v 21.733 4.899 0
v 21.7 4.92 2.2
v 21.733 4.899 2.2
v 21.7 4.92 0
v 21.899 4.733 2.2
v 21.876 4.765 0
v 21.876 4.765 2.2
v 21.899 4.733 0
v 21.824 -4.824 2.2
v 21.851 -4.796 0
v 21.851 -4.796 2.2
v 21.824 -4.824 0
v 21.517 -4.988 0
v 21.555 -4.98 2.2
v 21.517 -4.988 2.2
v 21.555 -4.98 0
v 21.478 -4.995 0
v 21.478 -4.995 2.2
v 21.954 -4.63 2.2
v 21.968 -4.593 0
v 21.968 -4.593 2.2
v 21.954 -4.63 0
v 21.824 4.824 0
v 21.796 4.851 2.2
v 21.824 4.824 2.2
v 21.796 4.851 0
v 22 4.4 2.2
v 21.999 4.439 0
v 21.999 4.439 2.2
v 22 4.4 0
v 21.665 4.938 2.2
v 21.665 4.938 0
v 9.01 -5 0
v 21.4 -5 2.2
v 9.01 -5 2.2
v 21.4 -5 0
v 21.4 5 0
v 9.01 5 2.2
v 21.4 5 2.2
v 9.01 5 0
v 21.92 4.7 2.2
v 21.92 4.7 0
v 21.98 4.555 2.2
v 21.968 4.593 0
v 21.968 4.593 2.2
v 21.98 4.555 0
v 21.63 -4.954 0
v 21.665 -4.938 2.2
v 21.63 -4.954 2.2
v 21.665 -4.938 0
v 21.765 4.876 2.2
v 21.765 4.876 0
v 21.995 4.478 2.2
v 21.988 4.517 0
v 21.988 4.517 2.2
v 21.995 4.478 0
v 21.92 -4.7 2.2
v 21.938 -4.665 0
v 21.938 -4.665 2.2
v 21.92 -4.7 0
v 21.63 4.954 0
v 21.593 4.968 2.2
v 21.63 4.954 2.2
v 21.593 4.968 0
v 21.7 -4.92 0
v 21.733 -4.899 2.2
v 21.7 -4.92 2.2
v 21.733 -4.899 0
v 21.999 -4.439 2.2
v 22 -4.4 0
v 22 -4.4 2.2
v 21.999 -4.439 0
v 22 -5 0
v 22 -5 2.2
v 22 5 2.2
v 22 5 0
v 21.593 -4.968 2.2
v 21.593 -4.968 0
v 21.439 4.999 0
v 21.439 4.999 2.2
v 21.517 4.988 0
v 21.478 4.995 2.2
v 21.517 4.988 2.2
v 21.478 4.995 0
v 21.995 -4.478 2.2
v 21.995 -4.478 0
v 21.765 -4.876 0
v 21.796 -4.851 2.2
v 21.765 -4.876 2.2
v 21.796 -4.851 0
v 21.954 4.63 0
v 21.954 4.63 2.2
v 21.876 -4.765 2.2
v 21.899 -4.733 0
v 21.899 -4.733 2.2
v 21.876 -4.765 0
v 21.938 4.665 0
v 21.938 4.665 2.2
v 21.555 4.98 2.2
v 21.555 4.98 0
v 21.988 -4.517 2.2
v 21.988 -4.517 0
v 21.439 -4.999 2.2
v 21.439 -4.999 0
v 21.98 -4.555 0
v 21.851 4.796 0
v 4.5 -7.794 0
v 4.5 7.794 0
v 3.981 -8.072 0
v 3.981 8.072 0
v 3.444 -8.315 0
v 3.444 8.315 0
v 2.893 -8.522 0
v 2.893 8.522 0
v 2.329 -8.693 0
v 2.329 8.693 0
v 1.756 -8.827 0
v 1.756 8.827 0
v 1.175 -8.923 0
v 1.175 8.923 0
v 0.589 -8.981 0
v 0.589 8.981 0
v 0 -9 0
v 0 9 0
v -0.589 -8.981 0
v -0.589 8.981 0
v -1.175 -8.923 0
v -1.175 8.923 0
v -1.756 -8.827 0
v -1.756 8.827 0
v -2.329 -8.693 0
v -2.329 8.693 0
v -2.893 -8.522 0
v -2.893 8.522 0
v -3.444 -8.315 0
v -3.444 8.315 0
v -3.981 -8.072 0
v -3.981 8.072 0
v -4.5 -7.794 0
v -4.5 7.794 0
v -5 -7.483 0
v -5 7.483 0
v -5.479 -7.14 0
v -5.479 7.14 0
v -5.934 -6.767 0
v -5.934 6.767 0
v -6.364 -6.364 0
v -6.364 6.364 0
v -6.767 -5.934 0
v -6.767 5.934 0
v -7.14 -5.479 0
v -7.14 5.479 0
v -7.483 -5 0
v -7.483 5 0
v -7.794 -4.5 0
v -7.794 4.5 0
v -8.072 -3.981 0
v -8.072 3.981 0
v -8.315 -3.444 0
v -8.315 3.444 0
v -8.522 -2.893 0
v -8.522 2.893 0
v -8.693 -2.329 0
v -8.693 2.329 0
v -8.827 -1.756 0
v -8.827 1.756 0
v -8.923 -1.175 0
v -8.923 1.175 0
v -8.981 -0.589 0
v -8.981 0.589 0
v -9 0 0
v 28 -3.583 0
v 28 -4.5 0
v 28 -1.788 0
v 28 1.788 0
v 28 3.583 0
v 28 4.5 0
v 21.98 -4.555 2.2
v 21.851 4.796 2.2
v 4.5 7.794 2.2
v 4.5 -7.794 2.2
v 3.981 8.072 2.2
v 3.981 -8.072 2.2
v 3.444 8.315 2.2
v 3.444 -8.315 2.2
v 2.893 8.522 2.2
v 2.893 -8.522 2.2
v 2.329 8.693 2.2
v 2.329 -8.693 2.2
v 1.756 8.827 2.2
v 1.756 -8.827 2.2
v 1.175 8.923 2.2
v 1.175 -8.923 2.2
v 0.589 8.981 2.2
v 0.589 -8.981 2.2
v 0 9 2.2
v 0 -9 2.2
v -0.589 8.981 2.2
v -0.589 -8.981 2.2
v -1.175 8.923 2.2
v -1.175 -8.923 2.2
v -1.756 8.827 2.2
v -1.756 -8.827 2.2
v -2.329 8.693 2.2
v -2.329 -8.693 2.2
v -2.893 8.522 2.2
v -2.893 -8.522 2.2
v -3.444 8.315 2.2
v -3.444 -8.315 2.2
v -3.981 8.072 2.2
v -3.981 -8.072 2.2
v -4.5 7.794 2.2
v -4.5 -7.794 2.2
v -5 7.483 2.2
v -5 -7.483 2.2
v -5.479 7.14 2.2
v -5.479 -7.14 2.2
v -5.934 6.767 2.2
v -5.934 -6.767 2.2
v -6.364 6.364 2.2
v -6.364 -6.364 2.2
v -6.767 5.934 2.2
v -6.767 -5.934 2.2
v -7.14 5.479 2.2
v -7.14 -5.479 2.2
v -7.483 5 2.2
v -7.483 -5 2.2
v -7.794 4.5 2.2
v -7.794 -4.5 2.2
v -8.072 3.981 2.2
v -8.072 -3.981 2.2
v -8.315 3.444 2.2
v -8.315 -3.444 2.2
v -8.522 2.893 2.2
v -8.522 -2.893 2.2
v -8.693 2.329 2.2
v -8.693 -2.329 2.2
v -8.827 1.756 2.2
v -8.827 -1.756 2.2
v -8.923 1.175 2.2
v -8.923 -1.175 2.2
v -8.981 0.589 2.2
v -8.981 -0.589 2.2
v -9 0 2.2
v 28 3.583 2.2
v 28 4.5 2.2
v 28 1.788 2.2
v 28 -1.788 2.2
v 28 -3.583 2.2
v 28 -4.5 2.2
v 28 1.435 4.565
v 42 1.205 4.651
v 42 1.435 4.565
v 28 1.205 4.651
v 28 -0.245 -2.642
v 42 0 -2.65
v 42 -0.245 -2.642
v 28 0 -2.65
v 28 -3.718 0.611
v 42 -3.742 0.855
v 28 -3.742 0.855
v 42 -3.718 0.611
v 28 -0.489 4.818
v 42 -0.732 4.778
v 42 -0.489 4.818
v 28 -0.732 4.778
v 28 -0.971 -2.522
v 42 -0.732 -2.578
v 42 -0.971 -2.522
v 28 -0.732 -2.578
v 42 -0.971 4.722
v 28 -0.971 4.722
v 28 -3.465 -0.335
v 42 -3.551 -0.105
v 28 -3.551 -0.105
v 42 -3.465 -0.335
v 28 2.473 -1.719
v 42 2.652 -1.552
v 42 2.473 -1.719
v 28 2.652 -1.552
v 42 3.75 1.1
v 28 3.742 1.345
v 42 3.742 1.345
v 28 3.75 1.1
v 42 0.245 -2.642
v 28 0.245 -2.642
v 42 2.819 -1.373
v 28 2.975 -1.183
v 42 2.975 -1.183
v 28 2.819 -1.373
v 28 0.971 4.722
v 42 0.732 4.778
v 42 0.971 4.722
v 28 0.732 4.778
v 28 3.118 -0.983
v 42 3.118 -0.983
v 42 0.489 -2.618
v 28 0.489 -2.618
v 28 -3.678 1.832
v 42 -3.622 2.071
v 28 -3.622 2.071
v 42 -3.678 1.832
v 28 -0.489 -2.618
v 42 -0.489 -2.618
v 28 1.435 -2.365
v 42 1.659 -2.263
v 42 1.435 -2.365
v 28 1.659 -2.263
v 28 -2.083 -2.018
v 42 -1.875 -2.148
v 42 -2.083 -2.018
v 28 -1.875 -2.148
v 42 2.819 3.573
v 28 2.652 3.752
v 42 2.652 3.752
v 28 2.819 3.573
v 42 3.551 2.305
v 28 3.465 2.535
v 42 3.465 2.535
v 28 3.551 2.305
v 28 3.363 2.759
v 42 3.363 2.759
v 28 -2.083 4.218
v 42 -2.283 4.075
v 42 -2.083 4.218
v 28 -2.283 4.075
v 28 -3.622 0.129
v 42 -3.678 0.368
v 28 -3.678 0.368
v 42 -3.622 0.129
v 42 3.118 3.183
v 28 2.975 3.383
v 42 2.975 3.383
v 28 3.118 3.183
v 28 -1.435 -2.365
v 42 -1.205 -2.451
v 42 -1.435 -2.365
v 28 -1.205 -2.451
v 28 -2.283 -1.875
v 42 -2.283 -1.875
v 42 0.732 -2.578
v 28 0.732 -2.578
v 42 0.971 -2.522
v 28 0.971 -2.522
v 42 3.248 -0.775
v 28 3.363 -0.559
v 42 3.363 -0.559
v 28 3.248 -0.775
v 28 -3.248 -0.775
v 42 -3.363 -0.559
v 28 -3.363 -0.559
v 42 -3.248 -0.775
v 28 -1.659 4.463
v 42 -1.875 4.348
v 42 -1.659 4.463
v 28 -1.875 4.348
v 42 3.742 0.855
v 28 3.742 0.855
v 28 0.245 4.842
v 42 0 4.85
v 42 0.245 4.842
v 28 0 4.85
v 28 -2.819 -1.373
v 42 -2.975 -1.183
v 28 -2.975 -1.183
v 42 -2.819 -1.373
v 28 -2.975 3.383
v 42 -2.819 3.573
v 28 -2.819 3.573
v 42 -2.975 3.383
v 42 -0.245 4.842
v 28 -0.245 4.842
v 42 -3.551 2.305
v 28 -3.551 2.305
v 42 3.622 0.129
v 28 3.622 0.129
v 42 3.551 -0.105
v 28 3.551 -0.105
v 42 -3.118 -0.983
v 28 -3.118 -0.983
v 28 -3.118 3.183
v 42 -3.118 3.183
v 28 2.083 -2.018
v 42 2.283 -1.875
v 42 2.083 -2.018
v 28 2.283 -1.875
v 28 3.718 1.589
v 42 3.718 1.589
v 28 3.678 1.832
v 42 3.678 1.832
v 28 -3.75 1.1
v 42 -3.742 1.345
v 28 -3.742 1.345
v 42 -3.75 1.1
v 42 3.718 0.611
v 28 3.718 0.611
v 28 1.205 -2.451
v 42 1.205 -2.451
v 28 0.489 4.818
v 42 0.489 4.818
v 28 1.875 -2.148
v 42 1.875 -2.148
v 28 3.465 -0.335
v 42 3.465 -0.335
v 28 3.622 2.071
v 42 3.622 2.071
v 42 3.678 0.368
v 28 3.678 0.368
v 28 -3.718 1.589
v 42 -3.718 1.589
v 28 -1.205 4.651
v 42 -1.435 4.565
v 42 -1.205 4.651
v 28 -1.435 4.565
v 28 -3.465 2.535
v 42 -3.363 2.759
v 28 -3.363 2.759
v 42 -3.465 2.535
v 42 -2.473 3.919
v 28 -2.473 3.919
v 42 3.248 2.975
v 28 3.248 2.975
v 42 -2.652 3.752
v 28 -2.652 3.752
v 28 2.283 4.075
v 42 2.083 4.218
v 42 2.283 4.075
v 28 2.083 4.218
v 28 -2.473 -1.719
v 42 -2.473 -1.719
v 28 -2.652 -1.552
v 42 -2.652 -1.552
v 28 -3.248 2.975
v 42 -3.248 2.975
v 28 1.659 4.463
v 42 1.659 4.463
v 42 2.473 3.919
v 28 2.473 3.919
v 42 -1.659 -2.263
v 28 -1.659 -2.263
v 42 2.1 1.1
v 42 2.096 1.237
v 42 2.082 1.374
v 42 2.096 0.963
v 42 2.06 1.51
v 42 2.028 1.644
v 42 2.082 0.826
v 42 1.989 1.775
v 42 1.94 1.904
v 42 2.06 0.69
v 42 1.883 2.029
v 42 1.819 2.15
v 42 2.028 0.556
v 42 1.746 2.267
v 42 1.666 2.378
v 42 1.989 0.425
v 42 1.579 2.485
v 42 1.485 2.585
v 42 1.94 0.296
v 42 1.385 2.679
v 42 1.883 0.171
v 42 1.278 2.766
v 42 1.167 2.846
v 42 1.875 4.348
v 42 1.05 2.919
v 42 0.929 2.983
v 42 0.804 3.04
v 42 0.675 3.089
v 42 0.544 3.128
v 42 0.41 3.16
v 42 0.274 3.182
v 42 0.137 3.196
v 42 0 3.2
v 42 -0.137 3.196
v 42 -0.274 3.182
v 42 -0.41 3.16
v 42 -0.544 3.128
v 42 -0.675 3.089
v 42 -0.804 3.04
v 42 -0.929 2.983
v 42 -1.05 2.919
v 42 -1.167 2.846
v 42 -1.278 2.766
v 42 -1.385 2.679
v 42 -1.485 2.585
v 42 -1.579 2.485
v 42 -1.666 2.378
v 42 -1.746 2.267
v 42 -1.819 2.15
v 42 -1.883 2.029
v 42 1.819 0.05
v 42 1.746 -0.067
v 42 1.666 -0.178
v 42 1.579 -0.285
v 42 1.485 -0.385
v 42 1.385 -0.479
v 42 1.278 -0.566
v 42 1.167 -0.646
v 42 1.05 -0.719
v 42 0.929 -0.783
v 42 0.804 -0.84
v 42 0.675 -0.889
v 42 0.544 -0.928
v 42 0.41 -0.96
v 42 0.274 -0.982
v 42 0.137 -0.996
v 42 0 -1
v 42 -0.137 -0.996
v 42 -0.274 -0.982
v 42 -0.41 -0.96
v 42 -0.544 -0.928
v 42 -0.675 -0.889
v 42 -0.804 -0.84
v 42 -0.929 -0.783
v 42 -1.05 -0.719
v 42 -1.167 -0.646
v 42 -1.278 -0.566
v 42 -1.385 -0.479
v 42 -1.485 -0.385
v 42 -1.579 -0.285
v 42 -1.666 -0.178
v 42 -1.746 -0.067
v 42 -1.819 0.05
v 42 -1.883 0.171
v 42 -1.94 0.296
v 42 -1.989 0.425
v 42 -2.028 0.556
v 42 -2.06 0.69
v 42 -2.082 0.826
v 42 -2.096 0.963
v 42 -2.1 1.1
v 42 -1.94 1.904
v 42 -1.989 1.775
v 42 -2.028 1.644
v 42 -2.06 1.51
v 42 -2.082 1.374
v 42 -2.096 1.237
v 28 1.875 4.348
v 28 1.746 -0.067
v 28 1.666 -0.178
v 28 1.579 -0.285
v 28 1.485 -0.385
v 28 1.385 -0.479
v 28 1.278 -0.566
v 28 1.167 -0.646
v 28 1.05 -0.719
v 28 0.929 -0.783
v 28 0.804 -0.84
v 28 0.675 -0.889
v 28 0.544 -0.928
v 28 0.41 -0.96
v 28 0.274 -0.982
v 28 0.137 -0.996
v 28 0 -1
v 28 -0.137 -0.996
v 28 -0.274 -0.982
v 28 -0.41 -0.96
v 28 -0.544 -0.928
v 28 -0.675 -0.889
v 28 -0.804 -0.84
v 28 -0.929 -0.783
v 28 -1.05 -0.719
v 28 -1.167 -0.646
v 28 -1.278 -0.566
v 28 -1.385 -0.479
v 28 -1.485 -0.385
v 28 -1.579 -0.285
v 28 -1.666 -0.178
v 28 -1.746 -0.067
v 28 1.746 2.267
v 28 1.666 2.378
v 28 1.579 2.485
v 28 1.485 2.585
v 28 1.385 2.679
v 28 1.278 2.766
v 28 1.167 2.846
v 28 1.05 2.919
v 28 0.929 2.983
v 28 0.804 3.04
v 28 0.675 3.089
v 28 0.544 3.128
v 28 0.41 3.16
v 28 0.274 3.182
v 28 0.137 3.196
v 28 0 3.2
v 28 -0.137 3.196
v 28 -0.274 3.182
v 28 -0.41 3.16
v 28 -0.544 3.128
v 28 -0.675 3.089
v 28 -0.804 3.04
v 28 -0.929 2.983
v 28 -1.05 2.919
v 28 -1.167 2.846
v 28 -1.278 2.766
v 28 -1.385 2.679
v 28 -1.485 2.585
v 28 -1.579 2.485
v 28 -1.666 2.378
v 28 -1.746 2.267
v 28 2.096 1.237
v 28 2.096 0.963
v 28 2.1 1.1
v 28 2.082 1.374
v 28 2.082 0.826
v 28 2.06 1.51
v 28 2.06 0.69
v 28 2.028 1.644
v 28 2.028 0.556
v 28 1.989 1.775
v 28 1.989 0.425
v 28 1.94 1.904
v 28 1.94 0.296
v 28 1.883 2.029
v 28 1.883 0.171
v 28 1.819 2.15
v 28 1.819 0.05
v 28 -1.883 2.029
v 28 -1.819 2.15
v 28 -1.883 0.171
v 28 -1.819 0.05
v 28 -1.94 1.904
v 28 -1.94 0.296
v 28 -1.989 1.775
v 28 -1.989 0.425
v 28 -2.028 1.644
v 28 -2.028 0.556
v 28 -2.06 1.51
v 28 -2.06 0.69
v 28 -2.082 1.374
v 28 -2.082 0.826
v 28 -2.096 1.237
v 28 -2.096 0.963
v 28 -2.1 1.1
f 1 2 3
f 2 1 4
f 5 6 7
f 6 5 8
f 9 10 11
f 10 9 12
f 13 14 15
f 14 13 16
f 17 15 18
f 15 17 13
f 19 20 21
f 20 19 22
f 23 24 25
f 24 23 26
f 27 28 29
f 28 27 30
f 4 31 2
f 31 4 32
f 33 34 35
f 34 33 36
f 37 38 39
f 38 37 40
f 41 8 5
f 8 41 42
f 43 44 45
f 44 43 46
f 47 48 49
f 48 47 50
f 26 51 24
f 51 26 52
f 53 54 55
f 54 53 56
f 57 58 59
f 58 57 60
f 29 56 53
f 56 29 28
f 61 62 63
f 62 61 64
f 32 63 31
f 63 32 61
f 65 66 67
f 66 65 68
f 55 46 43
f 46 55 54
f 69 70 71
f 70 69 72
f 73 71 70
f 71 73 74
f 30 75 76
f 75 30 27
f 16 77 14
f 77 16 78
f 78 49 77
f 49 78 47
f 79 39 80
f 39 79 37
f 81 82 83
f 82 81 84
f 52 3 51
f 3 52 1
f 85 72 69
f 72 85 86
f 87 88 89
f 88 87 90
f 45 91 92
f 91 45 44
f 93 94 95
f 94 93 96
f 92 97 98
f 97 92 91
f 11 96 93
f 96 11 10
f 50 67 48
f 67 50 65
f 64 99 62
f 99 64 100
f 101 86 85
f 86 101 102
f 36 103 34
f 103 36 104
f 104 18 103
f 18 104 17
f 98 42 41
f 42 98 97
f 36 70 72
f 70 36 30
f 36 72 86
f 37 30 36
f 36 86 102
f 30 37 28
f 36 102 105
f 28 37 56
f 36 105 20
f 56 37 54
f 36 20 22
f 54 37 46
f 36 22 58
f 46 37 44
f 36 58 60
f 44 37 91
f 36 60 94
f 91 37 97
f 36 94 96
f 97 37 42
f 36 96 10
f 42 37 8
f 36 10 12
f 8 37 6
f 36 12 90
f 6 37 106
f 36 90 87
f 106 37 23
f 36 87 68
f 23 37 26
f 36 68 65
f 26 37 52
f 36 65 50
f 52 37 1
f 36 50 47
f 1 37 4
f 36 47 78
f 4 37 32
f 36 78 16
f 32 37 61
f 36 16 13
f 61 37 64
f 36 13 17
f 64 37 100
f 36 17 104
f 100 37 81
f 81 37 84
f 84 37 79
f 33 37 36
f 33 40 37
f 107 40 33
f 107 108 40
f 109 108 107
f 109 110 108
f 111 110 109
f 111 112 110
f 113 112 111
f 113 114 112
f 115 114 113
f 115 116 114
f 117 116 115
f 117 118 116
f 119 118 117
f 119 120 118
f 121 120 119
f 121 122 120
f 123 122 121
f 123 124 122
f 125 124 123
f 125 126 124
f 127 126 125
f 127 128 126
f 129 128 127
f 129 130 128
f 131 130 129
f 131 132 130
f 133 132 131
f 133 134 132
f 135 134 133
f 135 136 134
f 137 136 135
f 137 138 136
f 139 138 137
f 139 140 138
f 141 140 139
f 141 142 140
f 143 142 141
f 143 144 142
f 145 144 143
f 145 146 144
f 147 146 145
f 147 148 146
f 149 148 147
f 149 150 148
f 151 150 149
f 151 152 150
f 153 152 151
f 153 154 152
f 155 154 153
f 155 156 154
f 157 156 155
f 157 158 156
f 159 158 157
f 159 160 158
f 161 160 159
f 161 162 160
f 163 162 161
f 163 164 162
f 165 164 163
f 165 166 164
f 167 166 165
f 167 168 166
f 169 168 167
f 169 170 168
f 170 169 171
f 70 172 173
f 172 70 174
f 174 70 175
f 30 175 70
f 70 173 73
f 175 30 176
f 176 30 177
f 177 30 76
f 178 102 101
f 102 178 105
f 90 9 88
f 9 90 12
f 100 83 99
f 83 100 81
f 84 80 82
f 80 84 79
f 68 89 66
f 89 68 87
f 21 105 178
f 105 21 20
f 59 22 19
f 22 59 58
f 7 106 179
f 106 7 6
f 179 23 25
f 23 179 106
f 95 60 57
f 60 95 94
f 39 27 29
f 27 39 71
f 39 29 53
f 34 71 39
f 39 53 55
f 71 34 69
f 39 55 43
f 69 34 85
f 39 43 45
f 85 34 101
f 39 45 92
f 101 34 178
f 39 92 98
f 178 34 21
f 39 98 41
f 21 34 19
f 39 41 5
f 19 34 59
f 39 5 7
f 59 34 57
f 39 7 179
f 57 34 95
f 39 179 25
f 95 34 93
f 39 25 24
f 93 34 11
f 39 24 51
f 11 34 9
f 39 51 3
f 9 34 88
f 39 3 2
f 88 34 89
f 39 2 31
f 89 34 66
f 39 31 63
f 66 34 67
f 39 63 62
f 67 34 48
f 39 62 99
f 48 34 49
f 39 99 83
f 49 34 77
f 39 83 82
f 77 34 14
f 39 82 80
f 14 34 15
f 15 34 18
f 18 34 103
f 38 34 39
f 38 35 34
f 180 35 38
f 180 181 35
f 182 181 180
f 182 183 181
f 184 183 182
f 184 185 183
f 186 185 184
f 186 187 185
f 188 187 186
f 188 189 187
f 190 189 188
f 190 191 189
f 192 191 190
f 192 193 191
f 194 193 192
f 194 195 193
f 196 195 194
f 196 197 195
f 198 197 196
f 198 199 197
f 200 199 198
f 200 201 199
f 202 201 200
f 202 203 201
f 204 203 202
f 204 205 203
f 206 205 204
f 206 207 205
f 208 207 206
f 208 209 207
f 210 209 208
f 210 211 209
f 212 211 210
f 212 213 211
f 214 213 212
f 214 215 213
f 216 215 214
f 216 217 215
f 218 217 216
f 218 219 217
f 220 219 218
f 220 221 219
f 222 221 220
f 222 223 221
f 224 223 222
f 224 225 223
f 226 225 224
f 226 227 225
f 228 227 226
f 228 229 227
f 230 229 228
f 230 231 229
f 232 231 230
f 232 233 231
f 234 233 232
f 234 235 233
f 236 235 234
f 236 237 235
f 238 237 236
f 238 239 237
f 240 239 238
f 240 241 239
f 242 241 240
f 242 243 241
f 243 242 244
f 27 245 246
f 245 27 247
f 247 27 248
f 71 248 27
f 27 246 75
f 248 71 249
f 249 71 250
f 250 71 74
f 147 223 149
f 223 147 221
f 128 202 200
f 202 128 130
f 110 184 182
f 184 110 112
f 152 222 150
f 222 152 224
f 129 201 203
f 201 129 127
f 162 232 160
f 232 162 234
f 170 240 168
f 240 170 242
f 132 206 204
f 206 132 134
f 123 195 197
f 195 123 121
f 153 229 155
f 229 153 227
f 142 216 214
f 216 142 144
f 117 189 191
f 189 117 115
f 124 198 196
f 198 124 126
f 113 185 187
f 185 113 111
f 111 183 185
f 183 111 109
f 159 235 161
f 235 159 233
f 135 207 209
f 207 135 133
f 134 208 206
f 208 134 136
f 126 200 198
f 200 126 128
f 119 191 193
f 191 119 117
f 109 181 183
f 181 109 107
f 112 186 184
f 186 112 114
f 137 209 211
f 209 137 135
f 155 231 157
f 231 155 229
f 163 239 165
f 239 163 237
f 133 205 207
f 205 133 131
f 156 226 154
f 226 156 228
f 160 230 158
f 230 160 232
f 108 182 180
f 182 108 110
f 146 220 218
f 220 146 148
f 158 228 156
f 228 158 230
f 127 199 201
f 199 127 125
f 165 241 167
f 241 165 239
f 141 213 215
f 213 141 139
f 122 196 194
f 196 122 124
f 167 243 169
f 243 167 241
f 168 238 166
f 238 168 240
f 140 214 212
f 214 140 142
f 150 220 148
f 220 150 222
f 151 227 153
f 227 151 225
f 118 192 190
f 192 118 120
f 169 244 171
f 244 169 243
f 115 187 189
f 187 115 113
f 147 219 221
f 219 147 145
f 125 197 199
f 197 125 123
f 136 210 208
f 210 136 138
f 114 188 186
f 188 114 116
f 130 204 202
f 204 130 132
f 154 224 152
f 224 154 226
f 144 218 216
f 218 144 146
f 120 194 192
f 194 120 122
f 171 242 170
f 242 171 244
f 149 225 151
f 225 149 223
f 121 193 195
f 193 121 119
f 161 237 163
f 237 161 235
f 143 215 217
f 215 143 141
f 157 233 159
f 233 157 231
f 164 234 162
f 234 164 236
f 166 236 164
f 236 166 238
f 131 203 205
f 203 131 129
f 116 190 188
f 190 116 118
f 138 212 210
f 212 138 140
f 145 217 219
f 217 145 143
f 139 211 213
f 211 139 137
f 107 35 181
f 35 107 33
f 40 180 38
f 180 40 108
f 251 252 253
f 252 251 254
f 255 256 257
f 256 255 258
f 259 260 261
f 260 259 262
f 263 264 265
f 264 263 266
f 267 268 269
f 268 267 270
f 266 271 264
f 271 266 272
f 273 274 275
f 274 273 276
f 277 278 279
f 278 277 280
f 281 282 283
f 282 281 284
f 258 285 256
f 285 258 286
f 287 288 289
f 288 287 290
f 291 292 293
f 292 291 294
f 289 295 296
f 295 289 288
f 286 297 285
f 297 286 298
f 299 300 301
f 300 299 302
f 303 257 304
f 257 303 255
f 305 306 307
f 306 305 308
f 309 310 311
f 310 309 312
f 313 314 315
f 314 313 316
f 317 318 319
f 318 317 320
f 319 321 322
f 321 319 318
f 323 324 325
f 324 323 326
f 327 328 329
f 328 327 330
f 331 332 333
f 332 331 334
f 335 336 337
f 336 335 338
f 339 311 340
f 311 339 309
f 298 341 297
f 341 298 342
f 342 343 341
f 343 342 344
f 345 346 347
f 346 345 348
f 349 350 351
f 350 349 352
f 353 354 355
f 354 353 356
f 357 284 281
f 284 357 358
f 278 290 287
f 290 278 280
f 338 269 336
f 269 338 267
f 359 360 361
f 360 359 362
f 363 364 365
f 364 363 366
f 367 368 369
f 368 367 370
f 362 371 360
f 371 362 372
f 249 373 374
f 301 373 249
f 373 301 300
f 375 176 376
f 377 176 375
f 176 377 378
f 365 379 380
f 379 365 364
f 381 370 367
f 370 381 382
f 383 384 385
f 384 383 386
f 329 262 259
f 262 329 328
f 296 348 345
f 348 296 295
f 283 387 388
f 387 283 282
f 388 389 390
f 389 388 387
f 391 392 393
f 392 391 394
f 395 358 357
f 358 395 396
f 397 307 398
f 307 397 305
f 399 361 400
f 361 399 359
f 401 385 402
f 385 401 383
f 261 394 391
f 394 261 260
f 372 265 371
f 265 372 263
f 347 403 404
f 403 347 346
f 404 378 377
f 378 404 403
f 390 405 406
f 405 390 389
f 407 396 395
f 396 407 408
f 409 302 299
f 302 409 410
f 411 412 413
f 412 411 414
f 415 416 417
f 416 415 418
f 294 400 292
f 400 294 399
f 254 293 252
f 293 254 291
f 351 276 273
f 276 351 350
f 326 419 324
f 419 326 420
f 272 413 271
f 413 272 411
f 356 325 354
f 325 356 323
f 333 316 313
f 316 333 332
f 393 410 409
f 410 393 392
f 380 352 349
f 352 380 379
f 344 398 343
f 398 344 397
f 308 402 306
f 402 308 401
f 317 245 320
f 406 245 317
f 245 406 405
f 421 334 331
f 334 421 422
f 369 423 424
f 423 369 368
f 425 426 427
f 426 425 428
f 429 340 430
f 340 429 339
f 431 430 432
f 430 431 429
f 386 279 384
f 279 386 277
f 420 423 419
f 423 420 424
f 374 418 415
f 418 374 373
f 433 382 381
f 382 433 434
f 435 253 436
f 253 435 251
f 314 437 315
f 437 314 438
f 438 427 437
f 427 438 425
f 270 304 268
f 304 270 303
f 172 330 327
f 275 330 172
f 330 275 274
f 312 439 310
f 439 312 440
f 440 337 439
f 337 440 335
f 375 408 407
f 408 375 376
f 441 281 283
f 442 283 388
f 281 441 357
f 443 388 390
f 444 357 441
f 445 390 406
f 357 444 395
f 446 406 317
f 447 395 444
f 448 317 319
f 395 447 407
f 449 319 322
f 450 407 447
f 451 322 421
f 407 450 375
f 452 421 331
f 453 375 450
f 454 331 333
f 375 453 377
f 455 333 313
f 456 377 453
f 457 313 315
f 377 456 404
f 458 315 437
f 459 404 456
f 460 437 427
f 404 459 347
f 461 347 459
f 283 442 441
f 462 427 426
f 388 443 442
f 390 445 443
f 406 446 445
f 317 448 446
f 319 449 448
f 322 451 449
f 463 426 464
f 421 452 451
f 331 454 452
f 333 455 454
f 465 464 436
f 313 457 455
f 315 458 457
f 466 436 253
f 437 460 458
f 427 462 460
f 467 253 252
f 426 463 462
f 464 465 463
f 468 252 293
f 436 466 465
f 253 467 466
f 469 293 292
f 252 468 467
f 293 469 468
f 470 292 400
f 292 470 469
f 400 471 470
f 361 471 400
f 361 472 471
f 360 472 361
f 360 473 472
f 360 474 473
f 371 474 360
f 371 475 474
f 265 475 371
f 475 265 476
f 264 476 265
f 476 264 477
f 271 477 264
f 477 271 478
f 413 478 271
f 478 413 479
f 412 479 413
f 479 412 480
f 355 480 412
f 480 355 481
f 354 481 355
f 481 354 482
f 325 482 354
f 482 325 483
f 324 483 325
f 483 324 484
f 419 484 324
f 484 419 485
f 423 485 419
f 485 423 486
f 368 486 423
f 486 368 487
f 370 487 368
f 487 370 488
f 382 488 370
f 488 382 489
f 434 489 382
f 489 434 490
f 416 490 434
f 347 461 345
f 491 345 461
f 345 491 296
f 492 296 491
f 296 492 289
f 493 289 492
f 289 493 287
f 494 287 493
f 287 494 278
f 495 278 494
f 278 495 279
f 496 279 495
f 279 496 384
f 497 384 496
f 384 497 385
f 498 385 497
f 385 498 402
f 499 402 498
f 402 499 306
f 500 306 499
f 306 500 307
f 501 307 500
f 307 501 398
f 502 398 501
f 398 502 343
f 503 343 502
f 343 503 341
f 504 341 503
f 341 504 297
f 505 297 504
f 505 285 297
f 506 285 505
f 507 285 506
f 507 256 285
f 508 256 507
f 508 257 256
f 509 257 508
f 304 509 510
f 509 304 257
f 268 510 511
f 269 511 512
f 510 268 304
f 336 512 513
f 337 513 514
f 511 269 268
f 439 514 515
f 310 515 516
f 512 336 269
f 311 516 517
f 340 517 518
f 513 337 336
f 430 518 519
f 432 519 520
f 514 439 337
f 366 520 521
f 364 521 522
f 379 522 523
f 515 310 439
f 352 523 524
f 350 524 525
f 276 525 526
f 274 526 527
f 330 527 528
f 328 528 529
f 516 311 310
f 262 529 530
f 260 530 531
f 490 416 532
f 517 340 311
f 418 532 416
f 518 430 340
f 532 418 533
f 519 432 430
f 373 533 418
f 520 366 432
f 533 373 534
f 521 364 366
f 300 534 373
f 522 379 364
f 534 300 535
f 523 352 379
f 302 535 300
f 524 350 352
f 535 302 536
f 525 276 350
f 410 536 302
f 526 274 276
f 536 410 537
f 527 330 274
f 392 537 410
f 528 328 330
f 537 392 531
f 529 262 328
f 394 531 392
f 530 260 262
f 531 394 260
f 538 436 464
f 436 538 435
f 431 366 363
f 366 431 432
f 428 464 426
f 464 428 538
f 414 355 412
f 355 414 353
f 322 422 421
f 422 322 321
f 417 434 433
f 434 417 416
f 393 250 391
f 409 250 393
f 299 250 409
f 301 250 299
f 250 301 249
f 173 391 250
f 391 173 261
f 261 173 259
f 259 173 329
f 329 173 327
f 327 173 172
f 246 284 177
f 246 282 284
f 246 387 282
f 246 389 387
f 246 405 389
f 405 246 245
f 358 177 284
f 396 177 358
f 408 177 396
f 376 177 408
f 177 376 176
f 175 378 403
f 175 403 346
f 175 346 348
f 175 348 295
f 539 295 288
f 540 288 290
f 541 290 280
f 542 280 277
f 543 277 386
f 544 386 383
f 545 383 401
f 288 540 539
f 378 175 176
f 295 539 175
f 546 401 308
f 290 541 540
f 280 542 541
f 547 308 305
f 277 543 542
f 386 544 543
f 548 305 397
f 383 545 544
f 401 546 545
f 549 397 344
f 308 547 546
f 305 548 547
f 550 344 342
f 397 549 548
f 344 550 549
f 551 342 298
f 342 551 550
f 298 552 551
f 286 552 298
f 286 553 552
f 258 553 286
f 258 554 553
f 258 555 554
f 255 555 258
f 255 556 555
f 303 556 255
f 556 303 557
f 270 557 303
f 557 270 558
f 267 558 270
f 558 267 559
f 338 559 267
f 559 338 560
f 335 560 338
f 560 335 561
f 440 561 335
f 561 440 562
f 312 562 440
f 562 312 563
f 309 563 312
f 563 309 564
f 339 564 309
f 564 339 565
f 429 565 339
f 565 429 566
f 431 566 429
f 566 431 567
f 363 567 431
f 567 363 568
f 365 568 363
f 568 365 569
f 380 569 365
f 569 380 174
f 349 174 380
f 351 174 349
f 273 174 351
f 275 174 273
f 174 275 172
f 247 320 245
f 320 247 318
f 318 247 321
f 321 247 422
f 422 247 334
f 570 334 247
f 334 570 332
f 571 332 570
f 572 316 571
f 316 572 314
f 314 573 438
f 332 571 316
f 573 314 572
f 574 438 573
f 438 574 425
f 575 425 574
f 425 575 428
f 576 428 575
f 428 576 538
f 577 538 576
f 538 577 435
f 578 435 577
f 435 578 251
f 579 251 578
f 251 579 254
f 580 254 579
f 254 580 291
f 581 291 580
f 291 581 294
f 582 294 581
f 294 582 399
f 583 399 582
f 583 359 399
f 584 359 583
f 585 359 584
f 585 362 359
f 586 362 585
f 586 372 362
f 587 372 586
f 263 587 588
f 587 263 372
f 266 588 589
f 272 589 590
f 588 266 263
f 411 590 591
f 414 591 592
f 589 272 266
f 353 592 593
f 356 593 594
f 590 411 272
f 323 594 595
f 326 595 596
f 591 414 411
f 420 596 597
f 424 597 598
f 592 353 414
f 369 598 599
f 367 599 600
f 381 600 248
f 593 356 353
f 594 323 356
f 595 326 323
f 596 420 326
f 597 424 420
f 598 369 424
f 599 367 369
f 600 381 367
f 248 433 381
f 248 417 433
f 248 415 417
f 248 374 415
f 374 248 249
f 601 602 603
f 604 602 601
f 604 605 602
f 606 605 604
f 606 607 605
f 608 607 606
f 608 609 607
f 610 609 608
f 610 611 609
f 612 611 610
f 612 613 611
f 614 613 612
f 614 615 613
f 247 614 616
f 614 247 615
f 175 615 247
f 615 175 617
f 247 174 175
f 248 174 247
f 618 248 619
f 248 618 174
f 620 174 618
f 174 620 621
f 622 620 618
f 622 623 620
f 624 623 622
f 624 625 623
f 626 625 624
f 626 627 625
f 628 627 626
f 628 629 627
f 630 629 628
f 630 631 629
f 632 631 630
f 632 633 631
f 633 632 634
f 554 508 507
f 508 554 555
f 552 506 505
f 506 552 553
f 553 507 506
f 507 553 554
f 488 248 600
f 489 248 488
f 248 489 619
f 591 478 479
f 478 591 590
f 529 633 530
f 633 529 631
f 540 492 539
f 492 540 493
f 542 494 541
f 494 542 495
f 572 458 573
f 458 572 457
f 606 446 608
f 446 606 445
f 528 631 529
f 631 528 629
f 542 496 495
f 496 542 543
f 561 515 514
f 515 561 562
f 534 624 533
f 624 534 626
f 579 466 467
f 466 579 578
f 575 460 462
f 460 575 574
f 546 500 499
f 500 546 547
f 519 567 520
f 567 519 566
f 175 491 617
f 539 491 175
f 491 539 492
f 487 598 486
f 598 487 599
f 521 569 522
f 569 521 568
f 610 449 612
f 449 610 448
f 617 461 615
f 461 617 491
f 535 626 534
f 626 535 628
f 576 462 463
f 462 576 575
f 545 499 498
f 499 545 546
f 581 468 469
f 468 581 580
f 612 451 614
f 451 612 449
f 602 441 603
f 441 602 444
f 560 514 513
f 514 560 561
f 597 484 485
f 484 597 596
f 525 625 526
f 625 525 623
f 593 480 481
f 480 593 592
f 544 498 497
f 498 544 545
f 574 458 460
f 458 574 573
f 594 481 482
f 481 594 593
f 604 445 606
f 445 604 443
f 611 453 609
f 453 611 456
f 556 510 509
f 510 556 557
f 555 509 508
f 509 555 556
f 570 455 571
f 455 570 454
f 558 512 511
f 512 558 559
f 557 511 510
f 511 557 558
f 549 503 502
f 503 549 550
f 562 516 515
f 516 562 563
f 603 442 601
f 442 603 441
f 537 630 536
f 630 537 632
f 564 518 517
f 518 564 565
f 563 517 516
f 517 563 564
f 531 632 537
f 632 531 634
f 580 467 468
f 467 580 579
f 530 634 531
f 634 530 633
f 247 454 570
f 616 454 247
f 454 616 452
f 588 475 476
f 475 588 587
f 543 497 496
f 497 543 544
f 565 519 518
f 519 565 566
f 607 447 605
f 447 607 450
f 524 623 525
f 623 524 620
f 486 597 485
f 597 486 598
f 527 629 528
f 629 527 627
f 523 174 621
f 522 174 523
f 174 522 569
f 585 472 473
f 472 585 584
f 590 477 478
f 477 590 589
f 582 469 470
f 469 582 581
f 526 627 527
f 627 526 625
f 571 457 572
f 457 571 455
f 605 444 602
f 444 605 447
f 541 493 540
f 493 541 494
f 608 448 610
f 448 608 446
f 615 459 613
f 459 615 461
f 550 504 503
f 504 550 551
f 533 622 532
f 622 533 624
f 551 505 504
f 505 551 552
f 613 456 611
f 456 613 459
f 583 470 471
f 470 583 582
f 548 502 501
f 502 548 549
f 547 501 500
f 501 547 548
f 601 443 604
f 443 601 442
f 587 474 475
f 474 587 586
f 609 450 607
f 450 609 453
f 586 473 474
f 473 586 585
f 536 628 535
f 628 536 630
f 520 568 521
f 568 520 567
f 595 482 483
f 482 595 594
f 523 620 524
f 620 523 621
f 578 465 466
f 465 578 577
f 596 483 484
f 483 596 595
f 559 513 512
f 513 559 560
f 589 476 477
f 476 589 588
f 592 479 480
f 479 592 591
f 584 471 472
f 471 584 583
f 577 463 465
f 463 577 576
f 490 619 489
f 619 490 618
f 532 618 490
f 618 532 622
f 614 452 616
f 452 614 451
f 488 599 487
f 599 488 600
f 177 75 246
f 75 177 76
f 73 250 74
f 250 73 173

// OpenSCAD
$fn=96;

// Ring terminal parameters (mm)
ring_outer_d = 18;
ring_inner_d = 8;

tongue_len   = 22;
tongue_w     = 10;
tongue_th    = 2.2;

wire_barrel_len = 14;
wire_barrel_od  = 7.5;
wire_barrel_id  = 4.2;

transition_len = 6;   // between tongue and barrel
transition_w2  = 9;   // width near barrel

// Small edge rounding (visual)
edge_r = 0.6;

module rounded_plate_2d(len, w, r){
    r2 = min(r, w/2, len/2);
    hull(){
        translate([ r2,  r2]) circle(r=r2);
        translate([len-r2,  r2]) circle(r=r2);
        translate([len-r2, w-r2]) circle(r=r2);
        translate([ r2, w-r2]) circle(r=r2);
    }
}

module tongue_with_ring(){
    // Tongue base with rounded corners
    difference(){
        linear_extrude(height=tongue_th)
            translate([0, -tongue_w/2])
                rounded_plate_2d(tongue_len, tongue_w, edge_r);

        // Ring hole
        translate([0,0,-1])
            cylinder(h=tongue_th+2, d=ring_inner_d);

        // Outer ring shaping (keep material only within outer ring near the eye)
        // Intersect tongue with outer ring disk to form the eye area
    }

    // Add eye reinforcement disk (outer ring)
    difference(){
        cylinder(h=tongue_th, d=ring_outer_d);
        translate([0,0,-1]) cylinder(h=tongue_th+2, d=ring_inner_d);
    }

    // Blend tongue into eye by adding a small fillet-like hull
    hull(){
        translate([0,0,0]) cylinder(h=tongue_th, d=ring_outer_d);
        translate([ring_outer_d/2,0,0])
            linear_extrude(height=tongue_th)
                translate([0,-tongue_w/2])
                    square([0.01, tongue_w], center=false);
    }
}

module transition_block(){
    // A tapered transition from tongue width to near-barrel width
    linear_extrude(height=tongue_th)
        polygon(points=[
            [tongue_len, -tongue_w/2],
            [tongue_len,  tongue_w/2],
            [tongue_len+transition_len,  transition_w2/2],
            [tongue_len+transition_len, -transition_w2/2]
        ]);
}

module barrel(){
    // Cylindrical crimp barrel aligned with tongue centerline
    translate([tongue_len+transition_len + wire_barrel_len/2, 0, tongue_th/2])
    rotate([0,90,0])
    difference(){
        cylinder(h=wire_barrel_len, d=wire_barrel_od, center=true);
        cylinder(h=wire_barrel_len+2, d=wire_barrel_id, center=true);
    }
}

module ring_terminal(){
    union(){
        tongue_with_ring();
        transition_block();
        barrel();
    }
}

ring_terminal();
